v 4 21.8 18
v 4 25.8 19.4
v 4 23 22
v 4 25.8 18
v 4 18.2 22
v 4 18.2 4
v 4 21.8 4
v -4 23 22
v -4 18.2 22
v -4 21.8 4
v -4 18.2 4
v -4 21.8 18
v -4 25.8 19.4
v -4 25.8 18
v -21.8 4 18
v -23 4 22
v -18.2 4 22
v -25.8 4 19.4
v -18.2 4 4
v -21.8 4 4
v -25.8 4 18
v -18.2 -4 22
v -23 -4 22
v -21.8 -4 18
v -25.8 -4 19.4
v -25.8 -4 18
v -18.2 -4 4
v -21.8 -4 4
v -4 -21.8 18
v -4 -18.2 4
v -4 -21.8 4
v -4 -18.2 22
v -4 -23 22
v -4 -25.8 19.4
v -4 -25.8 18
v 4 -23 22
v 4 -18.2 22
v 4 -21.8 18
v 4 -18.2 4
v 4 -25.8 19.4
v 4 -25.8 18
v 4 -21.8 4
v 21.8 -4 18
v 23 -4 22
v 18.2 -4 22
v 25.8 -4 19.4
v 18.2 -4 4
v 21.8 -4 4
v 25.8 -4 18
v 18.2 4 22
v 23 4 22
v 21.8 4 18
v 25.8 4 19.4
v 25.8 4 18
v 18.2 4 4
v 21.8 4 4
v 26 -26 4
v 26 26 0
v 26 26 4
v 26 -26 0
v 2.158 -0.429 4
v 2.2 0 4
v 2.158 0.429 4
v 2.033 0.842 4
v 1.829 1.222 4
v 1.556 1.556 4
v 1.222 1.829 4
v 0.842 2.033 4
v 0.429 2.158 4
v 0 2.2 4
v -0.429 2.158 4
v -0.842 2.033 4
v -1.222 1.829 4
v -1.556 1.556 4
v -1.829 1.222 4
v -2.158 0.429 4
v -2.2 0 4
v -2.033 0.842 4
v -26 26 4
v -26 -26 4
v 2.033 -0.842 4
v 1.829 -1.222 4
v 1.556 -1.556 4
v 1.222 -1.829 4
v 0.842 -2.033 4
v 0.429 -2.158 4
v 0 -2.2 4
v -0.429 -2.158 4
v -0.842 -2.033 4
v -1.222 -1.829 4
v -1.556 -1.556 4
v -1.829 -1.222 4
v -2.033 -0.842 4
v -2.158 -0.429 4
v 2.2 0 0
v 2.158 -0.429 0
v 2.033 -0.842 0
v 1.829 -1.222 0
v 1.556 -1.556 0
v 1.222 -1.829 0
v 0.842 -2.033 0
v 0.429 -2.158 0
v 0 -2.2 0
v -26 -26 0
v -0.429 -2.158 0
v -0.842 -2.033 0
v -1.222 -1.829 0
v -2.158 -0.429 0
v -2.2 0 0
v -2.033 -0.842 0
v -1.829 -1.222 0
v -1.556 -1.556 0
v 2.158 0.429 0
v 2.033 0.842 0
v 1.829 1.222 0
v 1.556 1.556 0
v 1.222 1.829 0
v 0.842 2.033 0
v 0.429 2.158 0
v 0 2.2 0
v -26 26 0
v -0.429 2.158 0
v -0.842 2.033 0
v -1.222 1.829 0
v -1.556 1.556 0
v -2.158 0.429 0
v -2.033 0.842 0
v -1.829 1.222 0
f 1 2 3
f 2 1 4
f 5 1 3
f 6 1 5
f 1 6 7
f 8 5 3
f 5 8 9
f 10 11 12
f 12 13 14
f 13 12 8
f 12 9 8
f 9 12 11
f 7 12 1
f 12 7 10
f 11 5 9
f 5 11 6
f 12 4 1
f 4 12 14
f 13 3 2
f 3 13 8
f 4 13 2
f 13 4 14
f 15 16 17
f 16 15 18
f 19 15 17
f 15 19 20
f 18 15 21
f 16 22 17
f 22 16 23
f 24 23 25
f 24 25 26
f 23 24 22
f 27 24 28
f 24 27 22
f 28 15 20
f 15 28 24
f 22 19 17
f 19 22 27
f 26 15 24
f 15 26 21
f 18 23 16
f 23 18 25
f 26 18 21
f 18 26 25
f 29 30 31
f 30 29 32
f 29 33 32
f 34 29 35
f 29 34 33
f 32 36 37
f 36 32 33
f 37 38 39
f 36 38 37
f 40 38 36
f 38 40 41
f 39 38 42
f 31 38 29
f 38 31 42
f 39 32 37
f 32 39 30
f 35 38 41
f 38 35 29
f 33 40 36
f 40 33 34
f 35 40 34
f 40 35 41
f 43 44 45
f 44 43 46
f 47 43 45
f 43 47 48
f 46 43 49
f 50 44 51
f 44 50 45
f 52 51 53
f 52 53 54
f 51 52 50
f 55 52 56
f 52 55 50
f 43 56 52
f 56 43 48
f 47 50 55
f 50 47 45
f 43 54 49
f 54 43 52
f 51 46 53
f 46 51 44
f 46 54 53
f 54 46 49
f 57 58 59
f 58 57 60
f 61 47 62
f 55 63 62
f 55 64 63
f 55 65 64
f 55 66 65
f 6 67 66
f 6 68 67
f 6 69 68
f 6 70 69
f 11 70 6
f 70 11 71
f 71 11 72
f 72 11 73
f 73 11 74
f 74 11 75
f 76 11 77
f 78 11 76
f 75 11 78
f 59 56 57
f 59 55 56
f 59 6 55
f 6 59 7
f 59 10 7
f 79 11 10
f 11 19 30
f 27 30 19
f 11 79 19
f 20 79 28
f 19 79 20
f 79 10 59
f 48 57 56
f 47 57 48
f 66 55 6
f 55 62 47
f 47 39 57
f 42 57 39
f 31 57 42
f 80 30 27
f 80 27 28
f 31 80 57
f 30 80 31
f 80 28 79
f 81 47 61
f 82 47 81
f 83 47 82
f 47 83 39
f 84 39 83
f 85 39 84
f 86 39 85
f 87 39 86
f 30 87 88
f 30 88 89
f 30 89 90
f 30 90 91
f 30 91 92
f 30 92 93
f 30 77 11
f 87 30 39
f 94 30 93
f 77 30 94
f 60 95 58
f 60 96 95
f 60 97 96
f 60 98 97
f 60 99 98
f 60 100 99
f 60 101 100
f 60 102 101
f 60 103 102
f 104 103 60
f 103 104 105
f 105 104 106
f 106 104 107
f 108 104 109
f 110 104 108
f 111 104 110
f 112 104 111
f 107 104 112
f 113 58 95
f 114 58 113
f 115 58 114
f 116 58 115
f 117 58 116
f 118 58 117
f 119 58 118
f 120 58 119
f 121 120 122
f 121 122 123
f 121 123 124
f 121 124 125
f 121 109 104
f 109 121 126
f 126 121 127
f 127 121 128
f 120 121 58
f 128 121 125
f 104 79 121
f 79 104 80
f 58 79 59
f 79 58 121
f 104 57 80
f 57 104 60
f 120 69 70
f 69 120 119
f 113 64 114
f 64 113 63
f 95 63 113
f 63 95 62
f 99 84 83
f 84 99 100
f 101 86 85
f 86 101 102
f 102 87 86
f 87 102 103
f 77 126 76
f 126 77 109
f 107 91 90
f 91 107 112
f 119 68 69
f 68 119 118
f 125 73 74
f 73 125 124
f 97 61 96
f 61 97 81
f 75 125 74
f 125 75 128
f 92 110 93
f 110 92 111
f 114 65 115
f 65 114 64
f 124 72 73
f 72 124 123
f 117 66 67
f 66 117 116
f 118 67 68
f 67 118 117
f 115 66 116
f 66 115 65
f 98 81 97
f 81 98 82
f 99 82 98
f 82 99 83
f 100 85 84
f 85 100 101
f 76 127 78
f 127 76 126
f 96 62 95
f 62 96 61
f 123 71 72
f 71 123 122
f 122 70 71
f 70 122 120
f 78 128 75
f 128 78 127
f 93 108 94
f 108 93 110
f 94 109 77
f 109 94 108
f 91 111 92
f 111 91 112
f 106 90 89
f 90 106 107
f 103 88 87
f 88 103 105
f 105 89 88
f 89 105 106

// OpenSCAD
$fn = 32;

// ----------------------------------------------------------------------
// Snap-fit latch: 4 arms, 18 mm tall, 4.2 mm undercut hooks
// ----------------------------------------------------------------------

// --- parameters (mm) ---
base_d = 52;              // base plate depth
base_h = 4;               // base plate thickness
span = 40;                // distance between opposite arms
arm_t = 3.6;              // arm thickness
arm_d = 8;                // arm width
height = 18;              // free arm length
head_len = 4.2;           // hook reach
head_h = 4;               // hook height
lead = 1.4;               // lead-in ramp thickness
bore_d = 4.4;             // base fixing bore
top_z = 22;               // height of the arm tips above the base

arms = 4;

difference() {
  union() {
    /* base plate, centred on the arm ring */
    translate([-26, -26, 0]) cube([base_d, base_d, base_h]);
    for (a = [0 : 360 / arms : 359]) rotate([0, 0, a]) {
    /* arm, sunk 0.5 mm into the base */
    translate([-arm_d / 2, span / 2 - arm_t / 2, base_h - 0.5]) cube([arm_d, arm_t, height + 0.5]);
    /* hook: a convex hull of a tall inner block and a thin outer lip
       gives a flat undercut below and a lead-in ramp on top */
    hull() {
      translate([-arm_d / 2, span / 2 + arm_t / 2 - 0.6, top_z - head_h]) cube([arm_d, lead + 0.4, head_h]);
      translate([-arm_d / 2, span / 2 + arm_t / 2 - 0.2, top_z - head_h]) cube([arm_d, head_len, lead]);
    }
    }
  }
  translate([0, 0, -2.5]) cylinder(h = base_h + 5, d = bore_d);
}
